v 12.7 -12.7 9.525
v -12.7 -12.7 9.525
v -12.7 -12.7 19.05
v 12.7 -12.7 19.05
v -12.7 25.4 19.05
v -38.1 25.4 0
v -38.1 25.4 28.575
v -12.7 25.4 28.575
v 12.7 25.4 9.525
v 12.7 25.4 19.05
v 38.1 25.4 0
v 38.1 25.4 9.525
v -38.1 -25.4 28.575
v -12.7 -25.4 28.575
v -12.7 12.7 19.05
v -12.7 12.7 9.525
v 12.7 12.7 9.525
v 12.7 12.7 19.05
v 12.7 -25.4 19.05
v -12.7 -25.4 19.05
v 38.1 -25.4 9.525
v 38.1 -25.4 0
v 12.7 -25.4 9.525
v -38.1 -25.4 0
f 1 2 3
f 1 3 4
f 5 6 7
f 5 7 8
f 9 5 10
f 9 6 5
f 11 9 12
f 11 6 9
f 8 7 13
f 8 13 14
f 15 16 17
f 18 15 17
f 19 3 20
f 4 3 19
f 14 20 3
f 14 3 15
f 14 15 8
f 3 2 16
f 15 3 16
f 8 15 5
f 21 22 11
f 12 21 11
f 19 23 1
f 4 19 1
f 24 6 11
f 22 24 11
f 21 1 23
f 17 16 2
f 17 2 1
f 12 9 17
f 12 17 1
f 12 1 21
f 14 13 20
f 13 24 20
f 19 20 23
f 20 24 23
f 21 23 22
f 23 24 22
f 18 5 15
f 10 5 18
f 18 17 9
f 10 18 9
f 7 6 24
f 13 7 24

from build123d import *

# Parameters (mm, degrees)
F0_W     = 76.2
F0_H     = 50.8
F1_DEPTH = 9.525
F2_W     = 25.4
F2_H     = 12.7
F2_H_2   = 25.4
F3_DEPTH = 19.05
F4_DEPTH = 9.525


with BuildPart() as f1:
    # F0 (on Top) → F1 (new body)
    with BuildSketch(Plane.XY):
        Rectangle(F0_W, F0_H)
    extrude(amount=F1_DEPTH)

    # F2 (on face) → F3 (join)
    with BuildSketch(Plane.XY.offset(9.525)):
        with Locations((-25.4, 19.05)):
            Rectangle(F2_W, F2_H)
        with Locations((-25.4, 0)):
            Rectangle(F2_W, F2_H_2)
        with Locations((-25.4, -19.05)):
            Rectangle(F2_W, F2_H)
    extrude(amount=F3_DEPTH)

    # F2 (on face) → F4 (join)
    with BuildSketch(Plane.XY.offset(9.525)):
        with Locations((-25.4, 19.05)):
            Rectangle(F2_W, F2_H)
        with Locations((0, 19.05)):
            Rectangle(F2_W, F2_H)
        with Locations((-25.4, 0)):
            Rectangle(F2_W, F2_H_2)
        with Locations((-25.4, -19.05)):
            Rectangle(F2_W, F2_H)
        with Locations((0, -19.05)):
            Rectangle(F2_W, F2_H)
    extrude(amount=F4_DEPTH)


solid = f1.part
